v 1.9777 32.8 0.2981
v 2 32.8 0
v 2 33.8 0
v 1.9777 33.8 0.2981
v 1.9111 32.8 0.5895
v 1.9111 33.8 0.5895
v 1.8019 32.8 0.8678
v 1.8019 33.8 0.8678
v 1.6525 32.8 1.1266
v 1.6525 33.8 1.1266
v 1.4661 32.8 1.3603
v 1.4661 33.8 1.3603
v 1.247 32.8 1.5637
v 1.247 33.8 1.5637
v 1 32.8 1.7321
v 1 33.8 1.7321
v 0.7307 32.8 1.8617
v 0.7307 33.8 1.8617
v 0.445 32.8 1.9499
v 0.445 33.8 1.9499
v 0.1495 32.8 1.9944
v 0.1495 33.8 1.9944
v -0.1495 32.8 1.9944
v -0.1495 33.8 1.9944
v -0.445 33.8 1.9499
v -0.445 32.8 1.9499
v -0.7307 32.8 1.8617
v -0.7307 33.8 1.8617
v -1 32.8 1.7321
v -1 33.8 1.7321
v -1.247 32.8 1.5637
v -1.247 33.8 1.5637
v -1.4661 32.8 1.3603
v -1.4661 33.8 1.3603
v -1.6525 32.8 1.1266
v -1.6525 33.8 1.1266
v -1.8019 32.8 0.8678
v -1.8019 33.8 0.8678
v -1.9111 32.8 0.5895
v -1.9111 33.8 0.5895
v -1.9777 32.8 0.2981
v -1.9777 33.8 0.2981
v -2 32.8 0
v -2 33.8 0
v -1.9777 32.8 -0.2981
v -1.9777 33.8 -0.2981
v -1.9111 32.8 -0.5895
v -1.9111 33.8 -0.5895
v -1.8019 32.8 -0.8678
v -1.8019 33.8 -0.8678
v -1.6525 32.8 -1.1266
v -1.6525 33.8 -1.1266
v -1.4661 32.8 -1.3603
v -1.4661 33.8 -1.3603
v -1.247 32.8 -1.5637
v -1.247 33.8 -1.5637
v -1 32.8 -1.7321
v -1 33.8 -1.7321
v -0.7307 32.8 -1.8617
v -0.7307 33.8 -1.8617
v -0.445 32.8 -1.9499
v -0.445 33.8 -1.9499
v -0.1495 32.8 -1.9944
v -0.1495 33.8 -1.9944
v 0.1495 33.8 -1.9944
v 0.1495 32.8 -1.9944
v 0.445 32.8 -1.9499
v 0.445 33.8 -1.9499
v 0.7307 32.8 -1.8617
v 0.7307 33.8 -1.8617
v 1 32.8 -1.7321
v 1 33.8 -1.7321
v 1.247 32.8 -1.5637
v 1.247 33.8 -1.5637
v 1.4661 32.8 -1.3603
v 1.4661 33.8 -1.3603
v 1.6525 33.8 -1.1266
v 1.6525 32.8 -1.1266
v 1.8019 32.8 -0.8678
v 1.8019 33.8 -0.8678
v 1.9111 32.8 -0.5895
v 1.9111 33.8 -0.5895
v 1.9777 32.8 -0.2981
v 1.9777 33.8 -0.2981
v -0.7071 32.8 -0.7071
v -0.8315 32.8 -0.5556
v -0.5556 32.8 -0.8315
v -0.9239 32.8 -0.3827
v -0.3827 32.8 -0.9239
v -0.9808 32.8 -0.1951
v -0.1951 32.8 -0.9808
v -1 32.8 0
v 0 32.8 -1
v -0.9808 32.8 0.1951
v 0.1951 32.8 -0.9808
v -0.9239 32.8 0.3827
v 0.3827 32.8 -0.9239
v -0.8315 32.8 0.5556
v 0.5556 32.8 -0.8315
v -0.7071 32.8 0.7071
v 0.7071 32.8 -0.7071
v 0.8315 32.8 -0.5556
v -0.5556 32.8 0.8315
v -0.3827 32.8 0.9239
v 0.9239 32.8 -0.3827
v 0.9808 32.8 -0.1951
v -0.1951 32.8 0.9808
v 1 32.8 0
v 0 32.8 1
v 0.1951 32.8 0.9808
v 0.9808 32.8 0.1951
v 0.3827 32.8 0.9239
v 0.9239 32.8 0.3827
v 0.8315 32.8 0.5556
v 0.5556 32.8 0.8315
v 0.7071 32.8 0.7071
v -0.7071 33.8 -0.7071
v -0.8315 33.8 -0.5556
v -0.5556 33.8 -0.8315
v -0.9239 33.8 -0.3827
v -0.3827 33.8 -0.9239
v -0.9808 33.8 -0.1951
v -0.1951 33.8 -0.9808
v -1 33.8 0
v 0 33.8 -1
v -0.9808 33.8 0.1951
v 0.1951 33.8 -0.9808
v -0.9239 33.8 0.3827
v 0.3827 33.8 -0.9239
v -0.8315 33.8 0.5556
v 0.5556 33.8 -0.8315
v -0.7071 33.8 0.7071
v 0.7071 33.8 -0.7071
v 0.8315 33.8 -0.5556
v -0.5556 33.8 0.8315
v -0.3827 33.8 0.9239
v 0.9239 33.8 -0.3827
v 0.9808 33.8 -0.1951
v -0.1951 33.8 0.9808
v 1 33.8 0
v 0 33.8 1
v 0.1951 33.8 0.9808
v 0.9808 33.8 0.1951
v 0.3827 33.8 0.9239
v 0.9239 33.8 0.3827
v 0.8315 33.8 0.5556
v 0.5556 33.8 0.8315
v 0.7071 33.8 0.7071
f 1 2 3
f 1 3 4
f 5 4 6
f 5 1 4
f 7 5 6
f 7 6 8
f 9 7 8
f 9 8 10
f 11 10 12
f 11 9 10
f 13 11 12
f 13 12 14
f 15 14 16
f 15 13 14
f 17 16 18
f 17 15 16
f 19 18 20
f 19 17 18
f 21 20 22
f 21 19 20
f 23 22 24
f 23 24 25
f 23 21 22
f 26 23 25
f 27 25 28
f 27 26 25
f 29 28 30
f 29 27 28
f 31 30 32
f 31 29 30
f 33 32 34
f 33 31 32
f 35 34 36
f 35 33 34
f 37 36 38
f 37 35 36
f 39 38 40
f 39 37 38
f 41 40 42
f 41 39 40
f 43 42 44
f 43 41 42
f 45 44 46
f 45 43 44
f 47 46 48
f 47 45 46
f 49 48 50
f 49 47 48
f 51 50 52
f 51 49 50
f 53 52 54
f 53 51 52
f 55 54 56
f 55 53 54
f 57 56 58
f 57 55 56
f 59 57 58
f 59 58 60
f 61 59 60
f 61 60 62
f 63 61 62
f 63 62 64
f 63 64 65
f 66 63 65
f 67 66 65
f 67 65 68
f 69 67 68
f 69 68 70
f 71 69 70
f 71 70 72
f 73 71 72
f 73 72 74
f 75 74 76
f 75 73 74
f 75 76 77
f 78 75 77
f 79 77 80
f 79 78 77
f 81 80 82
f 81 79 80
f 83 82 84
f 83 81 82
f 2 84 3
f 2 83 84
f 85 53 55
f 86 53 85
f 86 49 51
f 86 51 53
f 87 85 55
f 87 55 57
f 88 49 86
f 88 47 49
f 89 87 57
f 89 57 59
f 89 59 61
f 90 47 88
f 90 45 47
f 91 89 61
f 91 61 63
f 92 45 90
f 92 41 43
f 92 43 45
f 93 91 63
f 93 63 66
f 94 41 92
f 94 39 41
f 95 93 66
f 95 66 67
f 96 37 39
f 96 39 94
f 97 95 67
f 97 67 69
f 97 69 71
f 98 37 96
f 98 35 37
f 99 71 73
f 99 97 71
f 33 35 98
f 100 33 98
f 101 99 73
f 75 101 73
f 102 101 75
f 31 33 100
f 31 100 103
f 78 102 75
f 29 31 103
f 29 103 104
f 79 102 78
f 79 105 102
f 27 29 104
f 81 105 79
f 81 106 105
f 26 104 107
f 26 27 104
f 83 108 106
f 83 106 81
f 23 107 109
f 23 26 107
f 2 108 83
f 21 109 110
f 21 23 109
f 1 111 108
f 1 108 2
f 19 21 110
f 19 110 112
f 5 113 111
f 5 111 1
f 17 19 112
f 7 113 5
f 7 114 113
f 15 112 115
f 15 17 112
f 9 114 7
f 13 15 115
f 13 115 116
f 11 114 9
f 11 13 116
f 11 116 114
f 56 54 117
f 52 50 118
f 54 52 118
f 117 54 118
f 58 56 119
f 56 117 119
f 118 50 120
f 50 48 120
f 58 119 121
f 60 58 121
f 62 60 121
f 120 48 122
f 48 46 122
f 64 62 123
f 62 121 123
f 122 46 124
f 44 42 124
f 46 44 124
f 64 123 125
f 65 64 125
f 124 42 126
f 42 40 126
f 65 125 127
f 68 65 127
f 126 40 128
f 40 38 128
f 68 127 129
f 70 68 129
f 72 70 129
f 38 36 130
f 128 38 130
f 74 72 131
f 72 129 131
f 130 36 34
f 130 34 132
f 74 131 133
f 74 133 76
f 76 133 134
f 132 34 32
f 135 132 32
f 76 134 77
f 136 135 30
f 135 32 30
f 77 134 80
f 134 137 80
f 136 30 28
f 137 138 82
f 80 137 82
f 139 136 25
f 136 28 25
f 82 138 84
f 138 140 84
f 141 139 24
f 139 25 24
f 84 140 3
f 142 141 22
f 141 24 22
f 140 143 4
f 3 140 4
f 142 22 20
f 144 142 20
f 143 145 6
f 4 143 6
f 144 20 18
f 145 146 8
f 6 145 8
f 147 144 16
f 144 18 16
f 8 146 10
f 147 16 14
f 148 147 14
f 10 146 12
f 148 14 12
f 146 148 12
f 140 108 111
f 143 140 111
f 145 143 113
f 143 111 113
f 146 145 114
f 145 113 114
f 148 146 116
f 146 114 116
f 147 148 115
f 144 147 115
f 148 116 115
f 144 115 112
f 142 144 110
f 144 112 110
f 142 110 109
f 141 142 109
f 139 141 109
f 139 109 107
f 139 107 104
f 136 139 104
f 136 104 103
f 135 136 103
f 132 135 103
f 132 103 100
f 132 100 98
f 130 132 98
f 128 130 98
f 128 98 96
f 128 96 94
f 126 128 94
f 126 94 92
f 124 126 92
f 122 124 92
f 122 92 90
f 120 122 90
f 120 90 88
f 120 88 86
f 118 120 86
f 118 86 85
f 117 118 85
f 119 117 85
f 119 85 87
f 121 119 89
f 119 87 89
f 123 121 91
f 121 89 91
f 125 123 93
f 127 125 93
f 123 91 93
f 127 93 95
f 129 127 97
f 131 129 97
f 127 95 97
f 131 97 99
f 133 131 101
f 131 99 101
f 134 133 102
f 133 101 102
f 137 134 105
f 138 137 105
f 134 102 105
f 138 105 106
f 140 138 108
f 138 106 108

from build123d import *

# Parameters (mm, degrees)
SKETCH253_AS_DRAWN_R                 = 1
EXTRUDE055_DEPTH                     = 10
EXTRUDE055_ONTO_SKETCH253_ROLL_ANGLE = 90
SKETCH250_AS_DRAWN_R                 = 2
EXTRUDE053_DEPTH                     = 1
EXTRUDE053_ONTO_SKETCH250_ROLL_ANGLE = 90


with BuildPart() as extrude055:
    # Sketch253 as drawn → Extrude055 (new)
    with BuildSketch(Plane.XY):
        Circle(SKETCH253_AS_DRAWN_R)
    extrude(amount=-EXTRUDE055_DEPTH)


with BuildPart() as extrude055_1:
    # Extrude055 onto Sketch253 roll: moved
    add(extrude055.part.rotate(Axis((0, 0, 0), (1, 0, 0)), EXTRUDE055_ONTO_SKETCH253_ROLL_ANGLE))


with BuildPart() as extrude055_2:
    # Extrude055 onto Sketch253 placement: moved
    add(extrude055_1.part)


with BuildPart() as extrude055_3:
    # Extrude055 placement: moved
    add(extrude055_2.part.moved(Location((0, 30, 0))))


with BuildPart() as cut033:
    # Sketch250 as drawn → Extrude053 (new)
    with BuildSketch(Plane.XY):
        Circle(SKETCH250_AS_DRAWN_R)
    extrude(amount=-EXTRUDE053_DEPTH)


with BuildPart() as cut033_1:
    # Extrude053 onto Sketch250 roll: moved
    add(cut033.part.rotate(Axis((0, 0, 0), (1, 0, 0)), EXTRUDE053_ONTO_SKETCH250_ROLL_ANGLE))


with BuildPart() as cut033_2:
    # Extrude053 onto Sketch250 placement: moved
    add(cut033_1.part.moved(Location((0, 34, 0))))


with BuildPart() as cut033_3:
    # Extrude053 placement: moved
    add(cut033_2.part.moved(Location((0, -1.2, 0))))

    # Cut033: cut Extrude055
    add(extrude055_3.part, mode=Mode.SUBTRACT)


solid = cut033_3.part
